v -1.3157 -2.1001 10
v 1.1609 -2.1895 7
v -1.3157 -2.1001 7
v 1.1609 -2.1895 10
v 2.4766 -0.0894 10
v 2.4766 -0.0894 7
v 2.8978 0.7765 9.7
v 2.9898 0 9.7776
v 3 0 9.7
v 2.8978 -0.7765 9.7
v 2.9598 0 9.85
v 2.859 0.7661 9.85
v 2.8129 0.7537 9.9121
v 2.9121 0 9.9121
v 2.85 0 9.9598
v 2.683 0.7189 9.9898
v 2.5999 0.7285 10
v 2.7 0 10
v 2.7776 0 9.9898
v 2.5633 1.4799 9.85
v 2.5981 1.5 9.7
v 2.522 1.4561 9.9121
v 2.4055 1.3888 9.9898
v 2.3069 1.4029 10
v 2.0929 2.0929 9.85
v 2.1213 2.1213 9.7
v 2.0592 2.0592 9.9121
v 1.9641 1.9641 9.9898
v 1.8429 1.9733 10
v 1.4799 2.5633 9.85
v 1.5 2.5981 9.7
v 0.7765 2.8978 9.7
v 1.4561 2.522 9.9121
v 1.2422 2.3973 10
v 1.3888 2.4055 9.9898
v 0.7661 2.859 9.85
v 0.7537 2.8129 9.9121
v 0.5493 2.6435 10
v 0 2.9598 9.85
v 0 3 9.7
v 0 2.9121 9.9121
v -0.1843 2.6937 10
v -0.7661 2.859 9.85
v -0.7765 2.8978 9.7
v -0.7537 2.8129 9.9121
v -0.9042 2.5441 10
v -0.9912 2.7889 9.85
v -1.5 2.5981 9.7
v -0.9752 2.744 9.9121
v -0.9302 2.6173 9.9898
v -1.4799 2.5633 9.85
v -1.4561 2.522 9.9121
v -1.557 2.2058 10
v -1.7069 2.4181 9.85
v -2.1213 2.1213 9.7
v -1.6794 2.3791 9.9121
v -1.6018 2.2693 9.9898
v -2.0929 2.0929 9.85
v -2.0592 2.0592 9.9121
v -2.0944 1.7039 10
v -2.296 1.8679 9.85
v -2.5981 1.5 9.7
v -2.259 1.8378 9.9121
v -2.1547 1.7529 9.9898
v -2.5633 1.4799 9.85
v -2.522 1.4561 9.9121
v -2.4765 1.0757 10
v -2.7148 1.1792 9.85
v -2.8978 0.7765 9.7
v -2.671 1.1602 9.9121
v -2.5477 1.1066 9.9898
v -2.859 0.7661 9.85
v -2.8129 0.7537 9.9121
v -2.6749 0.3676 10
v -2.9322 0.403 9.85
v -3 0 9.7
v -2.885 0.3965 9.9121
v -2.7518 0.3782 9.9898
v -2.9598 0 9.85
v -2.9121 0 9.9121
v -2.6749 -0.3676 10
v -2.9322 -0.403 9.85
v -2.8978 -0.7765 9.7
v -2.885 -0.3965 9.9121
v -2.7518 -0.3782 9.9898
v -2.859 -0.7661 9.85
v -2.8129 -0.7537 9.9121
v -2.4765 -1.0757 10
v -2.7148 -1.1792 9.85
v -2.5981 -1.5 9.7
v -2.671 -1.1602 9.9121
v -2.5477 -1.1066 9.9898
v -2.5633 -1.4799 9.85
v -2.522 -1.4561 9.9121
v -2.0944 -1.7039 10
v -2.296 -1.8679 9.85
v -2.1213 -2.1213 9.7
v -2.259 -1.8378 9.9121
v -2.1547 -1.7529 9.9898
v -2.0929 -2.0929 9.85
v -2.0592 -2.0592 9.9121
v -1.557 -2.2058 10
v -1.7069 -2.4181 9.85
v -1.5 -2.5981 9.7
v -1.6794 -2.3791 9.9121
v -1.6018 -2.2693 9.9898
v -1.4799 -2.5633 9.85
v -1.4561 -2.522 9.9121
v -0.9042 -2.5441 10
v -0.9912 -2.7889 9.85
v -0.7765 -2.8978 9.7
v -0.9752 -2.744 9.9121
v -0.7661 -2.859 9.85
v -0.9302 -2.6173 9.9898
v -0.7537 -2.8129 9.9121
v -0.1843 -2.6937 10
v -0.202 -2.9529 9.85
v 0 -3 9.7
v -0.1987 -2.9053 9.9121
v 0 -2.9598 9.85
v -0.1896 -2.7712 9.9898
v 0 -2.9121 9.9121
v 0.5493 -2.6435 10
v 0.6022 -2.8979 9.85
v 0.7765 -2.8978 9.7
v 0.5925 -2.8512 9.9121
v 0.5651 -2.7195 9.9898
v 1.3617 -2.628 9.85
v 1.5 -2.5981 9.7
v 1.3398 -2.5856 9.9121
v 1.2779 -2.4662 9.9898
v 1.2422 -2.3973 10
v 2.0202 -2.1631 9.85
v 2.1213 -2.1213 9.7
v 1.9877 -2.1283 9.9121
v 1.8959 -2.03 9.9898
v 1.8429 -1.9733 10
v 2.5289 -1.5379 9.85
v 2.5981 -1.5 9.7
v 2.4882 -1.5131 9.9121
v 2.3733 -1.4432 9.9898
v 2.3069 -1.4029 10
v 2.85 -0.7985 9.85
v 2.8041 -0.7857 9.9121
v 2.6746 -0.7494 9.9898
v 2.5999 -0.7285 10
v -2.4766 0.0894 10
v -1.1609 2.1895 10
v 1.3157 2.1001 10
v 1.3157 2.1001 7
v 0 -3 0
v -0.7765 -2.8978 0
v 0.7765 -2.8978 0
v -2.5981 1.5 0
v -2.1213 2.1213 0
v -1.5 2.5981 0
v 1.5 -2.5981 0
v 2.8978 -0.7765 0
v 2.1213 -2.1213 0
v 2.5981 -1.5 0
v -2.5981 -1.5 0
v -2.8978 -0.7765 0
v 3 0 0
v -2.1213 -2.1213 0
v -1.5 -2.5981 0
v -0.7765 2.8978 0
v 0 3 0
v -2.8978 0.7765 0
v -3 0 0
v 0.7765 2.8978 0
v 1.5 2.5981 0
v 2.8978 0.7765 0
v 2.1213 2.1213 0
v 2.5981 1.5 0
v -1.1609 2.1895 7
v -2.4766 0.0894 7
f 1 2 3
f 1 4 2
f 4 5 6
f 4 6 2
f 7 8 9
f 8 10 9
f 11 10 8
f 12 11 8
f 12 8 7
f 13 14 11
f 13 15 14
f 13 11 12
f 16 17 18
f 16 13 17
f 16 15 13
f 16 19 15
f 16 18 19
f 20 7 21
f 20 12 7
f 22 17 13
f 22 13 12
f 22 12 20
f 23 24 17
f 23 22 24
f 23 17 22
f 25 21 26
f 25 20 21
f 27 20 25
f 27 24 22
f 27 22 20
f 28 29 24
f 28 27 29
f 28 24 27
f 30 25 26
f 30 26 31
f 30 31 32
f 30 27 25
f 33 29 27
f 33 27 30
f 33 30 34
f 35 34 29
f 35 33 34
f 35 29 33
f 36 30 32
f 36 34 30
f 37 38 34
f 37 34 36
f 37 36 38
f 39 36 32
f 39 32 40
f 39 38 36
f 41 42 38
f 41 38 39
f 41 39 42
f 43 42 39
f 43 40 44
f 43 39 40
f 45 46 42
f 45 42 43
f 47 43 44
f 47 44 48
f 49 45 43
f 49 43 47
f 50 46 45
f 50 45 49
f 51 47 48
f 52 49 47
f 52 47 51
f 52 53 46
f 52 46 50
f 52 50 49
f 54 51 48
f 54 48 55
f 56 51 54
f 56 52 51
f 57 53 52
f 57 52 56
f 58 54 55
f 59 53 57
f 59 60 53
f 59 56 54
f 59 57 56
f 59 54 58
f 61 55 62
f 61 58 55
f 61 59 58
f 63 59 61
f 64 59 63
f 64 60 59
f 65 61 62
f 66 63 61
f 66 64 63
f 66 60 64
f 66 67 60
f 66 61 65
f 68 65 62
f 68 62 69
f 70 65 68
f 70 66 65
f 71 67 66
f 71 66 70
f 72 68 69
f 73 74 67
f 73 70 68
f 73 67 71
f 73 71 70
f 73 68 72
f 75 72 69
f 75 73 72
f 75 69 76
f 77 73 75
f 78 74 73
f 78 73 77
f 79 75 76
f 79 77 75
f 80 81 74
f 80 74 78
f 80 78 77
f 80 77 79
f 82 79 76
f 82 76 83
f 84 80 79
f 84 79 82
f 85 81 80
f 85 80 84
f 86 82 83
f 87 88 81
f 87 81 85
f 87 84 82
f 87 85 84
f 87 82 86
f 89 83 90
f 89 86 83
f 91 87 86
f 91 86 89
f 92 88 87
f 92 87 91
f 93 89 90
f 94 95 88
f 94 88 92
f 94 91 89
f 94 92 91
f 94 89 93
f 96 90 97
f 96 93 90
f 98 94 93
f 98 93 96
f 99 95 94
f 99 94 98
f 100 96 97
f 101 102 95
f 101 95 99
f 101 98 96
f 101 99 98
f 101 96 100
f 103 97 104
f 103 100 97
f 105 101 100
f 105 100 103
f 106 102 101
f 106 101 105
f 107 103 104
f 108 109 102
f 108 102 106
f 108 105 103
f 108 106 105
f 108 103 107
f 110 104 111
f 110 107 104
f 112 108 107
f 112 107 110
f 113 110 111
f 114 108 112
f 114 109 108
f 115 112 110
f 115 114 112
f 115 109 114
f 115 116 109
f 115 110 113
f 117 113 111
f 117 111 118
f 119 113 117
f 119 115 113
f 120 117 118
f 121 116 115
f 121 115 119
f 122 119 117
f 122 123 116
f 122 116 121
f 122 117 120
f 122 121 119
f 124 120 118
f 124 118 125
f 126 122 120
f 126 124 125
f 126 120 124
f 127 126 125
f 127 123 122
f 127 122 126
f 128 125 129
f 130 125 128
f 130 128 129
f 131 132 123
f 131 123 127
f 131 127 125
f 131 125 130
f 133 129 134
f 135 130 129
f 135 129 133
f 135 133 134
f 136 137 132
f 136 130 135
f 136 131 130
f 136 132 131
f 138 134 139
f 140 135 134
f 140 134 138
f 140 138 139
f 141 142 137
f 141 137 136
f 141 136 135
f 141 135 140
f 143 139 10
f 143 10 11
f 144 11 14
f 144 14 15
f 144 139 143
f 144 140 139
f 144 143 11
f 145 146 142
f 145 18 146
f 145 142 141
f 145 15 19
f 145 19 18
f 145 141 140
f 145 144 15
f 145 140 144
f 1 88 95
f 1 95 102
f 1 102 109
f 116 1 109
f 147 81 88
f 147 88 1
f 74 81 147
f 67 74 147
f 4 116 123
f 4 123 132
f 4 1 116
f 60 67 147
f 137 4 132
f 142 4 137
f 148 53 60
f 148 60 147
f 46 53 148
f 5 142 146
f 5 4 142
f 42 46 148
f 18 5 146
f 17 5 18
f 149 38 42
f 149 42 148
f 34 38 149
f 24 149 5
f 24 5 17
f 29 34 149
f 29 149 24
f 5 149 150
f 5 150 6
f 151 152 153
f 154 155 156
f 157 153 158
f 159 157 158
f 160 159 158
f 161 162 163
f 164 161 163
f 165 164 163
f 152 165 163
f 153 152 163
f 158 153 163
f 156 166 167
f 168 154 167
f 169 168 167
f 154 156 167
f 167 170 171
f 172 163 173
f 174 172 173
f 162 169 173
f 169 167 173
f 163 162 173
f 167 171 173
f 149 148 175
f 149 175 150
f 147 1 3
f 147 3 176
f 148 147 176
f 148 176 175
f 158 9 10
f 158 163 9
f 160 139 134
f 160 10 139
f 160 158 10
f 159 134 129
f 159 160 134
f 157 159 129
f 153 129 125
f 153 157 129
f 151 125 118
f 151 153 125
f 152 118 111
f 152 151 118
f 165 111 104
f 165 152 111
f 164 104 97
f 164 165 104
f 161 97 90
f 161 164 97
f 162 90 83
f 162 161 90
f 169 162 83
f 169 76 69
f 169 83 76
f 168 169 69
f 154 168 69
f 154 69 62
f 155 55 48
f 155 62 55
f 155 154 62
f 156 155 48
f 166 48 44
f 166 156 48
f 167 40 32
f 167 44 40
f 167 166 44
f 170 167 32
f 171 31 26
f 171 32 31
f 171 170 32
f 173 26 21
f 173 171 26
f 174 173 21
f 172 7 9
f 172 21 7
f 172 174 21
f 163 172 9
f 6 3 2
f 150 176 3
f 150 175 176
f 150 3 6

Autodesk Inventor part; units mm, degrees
ref_plane "YZ Plane" through (0, 0, 0) normal (1, 0, 0) x (0, 1, 0)
ref_plane "XZ Plane" through (0, 0, 0) normal (0, 1, 0) x (-1, 0, 0)
ref_plane "XY Plane" through (0, 0, 0) normal (0, 0, 1) x (1, 0, 0)
sketch "Sketch1" plane through (0, 0, 0) normal (0, 0, 1) x (1, 0, 0)
  circle A0 centre (0, 0) radius 3
  dimension "d0" = 6
extrude "Extrusion1" add sketch "Sketch1" along normal blind 10
sketch "Sketch2" plane through (0, 0, 10) normal (0, 0, 1) x (1, 0, 0)
  circle A0 centre (0, 0) radius 3 projected
  line L0 (1.3157, 2.1001) -> (2.4766, -0.0894)
  line L1 (2.4766, -0.0894) -> (1.1609, -2.1895)
  line L2 (1.1609, -2.1895) -> (-1.3157, -2.1001)
  line L3 (-1.3157, -2.1001) -> (-2.4766, 0.0894)
  line L4 (-2.4766, 0.0894) -> (-1.1609, 2.1895)
  line L5 (-1.1609, 2.1895) -> (1.3157, 2.1001)
extrude "Extrusion2" cut sketch "Sketch2" against normal blind 3 contours L0 L1 L2 L3 L4 L5
fillet "Fillet1" radius 0.3 1 edges at (-3, 0, 10)
properties part number "4"
